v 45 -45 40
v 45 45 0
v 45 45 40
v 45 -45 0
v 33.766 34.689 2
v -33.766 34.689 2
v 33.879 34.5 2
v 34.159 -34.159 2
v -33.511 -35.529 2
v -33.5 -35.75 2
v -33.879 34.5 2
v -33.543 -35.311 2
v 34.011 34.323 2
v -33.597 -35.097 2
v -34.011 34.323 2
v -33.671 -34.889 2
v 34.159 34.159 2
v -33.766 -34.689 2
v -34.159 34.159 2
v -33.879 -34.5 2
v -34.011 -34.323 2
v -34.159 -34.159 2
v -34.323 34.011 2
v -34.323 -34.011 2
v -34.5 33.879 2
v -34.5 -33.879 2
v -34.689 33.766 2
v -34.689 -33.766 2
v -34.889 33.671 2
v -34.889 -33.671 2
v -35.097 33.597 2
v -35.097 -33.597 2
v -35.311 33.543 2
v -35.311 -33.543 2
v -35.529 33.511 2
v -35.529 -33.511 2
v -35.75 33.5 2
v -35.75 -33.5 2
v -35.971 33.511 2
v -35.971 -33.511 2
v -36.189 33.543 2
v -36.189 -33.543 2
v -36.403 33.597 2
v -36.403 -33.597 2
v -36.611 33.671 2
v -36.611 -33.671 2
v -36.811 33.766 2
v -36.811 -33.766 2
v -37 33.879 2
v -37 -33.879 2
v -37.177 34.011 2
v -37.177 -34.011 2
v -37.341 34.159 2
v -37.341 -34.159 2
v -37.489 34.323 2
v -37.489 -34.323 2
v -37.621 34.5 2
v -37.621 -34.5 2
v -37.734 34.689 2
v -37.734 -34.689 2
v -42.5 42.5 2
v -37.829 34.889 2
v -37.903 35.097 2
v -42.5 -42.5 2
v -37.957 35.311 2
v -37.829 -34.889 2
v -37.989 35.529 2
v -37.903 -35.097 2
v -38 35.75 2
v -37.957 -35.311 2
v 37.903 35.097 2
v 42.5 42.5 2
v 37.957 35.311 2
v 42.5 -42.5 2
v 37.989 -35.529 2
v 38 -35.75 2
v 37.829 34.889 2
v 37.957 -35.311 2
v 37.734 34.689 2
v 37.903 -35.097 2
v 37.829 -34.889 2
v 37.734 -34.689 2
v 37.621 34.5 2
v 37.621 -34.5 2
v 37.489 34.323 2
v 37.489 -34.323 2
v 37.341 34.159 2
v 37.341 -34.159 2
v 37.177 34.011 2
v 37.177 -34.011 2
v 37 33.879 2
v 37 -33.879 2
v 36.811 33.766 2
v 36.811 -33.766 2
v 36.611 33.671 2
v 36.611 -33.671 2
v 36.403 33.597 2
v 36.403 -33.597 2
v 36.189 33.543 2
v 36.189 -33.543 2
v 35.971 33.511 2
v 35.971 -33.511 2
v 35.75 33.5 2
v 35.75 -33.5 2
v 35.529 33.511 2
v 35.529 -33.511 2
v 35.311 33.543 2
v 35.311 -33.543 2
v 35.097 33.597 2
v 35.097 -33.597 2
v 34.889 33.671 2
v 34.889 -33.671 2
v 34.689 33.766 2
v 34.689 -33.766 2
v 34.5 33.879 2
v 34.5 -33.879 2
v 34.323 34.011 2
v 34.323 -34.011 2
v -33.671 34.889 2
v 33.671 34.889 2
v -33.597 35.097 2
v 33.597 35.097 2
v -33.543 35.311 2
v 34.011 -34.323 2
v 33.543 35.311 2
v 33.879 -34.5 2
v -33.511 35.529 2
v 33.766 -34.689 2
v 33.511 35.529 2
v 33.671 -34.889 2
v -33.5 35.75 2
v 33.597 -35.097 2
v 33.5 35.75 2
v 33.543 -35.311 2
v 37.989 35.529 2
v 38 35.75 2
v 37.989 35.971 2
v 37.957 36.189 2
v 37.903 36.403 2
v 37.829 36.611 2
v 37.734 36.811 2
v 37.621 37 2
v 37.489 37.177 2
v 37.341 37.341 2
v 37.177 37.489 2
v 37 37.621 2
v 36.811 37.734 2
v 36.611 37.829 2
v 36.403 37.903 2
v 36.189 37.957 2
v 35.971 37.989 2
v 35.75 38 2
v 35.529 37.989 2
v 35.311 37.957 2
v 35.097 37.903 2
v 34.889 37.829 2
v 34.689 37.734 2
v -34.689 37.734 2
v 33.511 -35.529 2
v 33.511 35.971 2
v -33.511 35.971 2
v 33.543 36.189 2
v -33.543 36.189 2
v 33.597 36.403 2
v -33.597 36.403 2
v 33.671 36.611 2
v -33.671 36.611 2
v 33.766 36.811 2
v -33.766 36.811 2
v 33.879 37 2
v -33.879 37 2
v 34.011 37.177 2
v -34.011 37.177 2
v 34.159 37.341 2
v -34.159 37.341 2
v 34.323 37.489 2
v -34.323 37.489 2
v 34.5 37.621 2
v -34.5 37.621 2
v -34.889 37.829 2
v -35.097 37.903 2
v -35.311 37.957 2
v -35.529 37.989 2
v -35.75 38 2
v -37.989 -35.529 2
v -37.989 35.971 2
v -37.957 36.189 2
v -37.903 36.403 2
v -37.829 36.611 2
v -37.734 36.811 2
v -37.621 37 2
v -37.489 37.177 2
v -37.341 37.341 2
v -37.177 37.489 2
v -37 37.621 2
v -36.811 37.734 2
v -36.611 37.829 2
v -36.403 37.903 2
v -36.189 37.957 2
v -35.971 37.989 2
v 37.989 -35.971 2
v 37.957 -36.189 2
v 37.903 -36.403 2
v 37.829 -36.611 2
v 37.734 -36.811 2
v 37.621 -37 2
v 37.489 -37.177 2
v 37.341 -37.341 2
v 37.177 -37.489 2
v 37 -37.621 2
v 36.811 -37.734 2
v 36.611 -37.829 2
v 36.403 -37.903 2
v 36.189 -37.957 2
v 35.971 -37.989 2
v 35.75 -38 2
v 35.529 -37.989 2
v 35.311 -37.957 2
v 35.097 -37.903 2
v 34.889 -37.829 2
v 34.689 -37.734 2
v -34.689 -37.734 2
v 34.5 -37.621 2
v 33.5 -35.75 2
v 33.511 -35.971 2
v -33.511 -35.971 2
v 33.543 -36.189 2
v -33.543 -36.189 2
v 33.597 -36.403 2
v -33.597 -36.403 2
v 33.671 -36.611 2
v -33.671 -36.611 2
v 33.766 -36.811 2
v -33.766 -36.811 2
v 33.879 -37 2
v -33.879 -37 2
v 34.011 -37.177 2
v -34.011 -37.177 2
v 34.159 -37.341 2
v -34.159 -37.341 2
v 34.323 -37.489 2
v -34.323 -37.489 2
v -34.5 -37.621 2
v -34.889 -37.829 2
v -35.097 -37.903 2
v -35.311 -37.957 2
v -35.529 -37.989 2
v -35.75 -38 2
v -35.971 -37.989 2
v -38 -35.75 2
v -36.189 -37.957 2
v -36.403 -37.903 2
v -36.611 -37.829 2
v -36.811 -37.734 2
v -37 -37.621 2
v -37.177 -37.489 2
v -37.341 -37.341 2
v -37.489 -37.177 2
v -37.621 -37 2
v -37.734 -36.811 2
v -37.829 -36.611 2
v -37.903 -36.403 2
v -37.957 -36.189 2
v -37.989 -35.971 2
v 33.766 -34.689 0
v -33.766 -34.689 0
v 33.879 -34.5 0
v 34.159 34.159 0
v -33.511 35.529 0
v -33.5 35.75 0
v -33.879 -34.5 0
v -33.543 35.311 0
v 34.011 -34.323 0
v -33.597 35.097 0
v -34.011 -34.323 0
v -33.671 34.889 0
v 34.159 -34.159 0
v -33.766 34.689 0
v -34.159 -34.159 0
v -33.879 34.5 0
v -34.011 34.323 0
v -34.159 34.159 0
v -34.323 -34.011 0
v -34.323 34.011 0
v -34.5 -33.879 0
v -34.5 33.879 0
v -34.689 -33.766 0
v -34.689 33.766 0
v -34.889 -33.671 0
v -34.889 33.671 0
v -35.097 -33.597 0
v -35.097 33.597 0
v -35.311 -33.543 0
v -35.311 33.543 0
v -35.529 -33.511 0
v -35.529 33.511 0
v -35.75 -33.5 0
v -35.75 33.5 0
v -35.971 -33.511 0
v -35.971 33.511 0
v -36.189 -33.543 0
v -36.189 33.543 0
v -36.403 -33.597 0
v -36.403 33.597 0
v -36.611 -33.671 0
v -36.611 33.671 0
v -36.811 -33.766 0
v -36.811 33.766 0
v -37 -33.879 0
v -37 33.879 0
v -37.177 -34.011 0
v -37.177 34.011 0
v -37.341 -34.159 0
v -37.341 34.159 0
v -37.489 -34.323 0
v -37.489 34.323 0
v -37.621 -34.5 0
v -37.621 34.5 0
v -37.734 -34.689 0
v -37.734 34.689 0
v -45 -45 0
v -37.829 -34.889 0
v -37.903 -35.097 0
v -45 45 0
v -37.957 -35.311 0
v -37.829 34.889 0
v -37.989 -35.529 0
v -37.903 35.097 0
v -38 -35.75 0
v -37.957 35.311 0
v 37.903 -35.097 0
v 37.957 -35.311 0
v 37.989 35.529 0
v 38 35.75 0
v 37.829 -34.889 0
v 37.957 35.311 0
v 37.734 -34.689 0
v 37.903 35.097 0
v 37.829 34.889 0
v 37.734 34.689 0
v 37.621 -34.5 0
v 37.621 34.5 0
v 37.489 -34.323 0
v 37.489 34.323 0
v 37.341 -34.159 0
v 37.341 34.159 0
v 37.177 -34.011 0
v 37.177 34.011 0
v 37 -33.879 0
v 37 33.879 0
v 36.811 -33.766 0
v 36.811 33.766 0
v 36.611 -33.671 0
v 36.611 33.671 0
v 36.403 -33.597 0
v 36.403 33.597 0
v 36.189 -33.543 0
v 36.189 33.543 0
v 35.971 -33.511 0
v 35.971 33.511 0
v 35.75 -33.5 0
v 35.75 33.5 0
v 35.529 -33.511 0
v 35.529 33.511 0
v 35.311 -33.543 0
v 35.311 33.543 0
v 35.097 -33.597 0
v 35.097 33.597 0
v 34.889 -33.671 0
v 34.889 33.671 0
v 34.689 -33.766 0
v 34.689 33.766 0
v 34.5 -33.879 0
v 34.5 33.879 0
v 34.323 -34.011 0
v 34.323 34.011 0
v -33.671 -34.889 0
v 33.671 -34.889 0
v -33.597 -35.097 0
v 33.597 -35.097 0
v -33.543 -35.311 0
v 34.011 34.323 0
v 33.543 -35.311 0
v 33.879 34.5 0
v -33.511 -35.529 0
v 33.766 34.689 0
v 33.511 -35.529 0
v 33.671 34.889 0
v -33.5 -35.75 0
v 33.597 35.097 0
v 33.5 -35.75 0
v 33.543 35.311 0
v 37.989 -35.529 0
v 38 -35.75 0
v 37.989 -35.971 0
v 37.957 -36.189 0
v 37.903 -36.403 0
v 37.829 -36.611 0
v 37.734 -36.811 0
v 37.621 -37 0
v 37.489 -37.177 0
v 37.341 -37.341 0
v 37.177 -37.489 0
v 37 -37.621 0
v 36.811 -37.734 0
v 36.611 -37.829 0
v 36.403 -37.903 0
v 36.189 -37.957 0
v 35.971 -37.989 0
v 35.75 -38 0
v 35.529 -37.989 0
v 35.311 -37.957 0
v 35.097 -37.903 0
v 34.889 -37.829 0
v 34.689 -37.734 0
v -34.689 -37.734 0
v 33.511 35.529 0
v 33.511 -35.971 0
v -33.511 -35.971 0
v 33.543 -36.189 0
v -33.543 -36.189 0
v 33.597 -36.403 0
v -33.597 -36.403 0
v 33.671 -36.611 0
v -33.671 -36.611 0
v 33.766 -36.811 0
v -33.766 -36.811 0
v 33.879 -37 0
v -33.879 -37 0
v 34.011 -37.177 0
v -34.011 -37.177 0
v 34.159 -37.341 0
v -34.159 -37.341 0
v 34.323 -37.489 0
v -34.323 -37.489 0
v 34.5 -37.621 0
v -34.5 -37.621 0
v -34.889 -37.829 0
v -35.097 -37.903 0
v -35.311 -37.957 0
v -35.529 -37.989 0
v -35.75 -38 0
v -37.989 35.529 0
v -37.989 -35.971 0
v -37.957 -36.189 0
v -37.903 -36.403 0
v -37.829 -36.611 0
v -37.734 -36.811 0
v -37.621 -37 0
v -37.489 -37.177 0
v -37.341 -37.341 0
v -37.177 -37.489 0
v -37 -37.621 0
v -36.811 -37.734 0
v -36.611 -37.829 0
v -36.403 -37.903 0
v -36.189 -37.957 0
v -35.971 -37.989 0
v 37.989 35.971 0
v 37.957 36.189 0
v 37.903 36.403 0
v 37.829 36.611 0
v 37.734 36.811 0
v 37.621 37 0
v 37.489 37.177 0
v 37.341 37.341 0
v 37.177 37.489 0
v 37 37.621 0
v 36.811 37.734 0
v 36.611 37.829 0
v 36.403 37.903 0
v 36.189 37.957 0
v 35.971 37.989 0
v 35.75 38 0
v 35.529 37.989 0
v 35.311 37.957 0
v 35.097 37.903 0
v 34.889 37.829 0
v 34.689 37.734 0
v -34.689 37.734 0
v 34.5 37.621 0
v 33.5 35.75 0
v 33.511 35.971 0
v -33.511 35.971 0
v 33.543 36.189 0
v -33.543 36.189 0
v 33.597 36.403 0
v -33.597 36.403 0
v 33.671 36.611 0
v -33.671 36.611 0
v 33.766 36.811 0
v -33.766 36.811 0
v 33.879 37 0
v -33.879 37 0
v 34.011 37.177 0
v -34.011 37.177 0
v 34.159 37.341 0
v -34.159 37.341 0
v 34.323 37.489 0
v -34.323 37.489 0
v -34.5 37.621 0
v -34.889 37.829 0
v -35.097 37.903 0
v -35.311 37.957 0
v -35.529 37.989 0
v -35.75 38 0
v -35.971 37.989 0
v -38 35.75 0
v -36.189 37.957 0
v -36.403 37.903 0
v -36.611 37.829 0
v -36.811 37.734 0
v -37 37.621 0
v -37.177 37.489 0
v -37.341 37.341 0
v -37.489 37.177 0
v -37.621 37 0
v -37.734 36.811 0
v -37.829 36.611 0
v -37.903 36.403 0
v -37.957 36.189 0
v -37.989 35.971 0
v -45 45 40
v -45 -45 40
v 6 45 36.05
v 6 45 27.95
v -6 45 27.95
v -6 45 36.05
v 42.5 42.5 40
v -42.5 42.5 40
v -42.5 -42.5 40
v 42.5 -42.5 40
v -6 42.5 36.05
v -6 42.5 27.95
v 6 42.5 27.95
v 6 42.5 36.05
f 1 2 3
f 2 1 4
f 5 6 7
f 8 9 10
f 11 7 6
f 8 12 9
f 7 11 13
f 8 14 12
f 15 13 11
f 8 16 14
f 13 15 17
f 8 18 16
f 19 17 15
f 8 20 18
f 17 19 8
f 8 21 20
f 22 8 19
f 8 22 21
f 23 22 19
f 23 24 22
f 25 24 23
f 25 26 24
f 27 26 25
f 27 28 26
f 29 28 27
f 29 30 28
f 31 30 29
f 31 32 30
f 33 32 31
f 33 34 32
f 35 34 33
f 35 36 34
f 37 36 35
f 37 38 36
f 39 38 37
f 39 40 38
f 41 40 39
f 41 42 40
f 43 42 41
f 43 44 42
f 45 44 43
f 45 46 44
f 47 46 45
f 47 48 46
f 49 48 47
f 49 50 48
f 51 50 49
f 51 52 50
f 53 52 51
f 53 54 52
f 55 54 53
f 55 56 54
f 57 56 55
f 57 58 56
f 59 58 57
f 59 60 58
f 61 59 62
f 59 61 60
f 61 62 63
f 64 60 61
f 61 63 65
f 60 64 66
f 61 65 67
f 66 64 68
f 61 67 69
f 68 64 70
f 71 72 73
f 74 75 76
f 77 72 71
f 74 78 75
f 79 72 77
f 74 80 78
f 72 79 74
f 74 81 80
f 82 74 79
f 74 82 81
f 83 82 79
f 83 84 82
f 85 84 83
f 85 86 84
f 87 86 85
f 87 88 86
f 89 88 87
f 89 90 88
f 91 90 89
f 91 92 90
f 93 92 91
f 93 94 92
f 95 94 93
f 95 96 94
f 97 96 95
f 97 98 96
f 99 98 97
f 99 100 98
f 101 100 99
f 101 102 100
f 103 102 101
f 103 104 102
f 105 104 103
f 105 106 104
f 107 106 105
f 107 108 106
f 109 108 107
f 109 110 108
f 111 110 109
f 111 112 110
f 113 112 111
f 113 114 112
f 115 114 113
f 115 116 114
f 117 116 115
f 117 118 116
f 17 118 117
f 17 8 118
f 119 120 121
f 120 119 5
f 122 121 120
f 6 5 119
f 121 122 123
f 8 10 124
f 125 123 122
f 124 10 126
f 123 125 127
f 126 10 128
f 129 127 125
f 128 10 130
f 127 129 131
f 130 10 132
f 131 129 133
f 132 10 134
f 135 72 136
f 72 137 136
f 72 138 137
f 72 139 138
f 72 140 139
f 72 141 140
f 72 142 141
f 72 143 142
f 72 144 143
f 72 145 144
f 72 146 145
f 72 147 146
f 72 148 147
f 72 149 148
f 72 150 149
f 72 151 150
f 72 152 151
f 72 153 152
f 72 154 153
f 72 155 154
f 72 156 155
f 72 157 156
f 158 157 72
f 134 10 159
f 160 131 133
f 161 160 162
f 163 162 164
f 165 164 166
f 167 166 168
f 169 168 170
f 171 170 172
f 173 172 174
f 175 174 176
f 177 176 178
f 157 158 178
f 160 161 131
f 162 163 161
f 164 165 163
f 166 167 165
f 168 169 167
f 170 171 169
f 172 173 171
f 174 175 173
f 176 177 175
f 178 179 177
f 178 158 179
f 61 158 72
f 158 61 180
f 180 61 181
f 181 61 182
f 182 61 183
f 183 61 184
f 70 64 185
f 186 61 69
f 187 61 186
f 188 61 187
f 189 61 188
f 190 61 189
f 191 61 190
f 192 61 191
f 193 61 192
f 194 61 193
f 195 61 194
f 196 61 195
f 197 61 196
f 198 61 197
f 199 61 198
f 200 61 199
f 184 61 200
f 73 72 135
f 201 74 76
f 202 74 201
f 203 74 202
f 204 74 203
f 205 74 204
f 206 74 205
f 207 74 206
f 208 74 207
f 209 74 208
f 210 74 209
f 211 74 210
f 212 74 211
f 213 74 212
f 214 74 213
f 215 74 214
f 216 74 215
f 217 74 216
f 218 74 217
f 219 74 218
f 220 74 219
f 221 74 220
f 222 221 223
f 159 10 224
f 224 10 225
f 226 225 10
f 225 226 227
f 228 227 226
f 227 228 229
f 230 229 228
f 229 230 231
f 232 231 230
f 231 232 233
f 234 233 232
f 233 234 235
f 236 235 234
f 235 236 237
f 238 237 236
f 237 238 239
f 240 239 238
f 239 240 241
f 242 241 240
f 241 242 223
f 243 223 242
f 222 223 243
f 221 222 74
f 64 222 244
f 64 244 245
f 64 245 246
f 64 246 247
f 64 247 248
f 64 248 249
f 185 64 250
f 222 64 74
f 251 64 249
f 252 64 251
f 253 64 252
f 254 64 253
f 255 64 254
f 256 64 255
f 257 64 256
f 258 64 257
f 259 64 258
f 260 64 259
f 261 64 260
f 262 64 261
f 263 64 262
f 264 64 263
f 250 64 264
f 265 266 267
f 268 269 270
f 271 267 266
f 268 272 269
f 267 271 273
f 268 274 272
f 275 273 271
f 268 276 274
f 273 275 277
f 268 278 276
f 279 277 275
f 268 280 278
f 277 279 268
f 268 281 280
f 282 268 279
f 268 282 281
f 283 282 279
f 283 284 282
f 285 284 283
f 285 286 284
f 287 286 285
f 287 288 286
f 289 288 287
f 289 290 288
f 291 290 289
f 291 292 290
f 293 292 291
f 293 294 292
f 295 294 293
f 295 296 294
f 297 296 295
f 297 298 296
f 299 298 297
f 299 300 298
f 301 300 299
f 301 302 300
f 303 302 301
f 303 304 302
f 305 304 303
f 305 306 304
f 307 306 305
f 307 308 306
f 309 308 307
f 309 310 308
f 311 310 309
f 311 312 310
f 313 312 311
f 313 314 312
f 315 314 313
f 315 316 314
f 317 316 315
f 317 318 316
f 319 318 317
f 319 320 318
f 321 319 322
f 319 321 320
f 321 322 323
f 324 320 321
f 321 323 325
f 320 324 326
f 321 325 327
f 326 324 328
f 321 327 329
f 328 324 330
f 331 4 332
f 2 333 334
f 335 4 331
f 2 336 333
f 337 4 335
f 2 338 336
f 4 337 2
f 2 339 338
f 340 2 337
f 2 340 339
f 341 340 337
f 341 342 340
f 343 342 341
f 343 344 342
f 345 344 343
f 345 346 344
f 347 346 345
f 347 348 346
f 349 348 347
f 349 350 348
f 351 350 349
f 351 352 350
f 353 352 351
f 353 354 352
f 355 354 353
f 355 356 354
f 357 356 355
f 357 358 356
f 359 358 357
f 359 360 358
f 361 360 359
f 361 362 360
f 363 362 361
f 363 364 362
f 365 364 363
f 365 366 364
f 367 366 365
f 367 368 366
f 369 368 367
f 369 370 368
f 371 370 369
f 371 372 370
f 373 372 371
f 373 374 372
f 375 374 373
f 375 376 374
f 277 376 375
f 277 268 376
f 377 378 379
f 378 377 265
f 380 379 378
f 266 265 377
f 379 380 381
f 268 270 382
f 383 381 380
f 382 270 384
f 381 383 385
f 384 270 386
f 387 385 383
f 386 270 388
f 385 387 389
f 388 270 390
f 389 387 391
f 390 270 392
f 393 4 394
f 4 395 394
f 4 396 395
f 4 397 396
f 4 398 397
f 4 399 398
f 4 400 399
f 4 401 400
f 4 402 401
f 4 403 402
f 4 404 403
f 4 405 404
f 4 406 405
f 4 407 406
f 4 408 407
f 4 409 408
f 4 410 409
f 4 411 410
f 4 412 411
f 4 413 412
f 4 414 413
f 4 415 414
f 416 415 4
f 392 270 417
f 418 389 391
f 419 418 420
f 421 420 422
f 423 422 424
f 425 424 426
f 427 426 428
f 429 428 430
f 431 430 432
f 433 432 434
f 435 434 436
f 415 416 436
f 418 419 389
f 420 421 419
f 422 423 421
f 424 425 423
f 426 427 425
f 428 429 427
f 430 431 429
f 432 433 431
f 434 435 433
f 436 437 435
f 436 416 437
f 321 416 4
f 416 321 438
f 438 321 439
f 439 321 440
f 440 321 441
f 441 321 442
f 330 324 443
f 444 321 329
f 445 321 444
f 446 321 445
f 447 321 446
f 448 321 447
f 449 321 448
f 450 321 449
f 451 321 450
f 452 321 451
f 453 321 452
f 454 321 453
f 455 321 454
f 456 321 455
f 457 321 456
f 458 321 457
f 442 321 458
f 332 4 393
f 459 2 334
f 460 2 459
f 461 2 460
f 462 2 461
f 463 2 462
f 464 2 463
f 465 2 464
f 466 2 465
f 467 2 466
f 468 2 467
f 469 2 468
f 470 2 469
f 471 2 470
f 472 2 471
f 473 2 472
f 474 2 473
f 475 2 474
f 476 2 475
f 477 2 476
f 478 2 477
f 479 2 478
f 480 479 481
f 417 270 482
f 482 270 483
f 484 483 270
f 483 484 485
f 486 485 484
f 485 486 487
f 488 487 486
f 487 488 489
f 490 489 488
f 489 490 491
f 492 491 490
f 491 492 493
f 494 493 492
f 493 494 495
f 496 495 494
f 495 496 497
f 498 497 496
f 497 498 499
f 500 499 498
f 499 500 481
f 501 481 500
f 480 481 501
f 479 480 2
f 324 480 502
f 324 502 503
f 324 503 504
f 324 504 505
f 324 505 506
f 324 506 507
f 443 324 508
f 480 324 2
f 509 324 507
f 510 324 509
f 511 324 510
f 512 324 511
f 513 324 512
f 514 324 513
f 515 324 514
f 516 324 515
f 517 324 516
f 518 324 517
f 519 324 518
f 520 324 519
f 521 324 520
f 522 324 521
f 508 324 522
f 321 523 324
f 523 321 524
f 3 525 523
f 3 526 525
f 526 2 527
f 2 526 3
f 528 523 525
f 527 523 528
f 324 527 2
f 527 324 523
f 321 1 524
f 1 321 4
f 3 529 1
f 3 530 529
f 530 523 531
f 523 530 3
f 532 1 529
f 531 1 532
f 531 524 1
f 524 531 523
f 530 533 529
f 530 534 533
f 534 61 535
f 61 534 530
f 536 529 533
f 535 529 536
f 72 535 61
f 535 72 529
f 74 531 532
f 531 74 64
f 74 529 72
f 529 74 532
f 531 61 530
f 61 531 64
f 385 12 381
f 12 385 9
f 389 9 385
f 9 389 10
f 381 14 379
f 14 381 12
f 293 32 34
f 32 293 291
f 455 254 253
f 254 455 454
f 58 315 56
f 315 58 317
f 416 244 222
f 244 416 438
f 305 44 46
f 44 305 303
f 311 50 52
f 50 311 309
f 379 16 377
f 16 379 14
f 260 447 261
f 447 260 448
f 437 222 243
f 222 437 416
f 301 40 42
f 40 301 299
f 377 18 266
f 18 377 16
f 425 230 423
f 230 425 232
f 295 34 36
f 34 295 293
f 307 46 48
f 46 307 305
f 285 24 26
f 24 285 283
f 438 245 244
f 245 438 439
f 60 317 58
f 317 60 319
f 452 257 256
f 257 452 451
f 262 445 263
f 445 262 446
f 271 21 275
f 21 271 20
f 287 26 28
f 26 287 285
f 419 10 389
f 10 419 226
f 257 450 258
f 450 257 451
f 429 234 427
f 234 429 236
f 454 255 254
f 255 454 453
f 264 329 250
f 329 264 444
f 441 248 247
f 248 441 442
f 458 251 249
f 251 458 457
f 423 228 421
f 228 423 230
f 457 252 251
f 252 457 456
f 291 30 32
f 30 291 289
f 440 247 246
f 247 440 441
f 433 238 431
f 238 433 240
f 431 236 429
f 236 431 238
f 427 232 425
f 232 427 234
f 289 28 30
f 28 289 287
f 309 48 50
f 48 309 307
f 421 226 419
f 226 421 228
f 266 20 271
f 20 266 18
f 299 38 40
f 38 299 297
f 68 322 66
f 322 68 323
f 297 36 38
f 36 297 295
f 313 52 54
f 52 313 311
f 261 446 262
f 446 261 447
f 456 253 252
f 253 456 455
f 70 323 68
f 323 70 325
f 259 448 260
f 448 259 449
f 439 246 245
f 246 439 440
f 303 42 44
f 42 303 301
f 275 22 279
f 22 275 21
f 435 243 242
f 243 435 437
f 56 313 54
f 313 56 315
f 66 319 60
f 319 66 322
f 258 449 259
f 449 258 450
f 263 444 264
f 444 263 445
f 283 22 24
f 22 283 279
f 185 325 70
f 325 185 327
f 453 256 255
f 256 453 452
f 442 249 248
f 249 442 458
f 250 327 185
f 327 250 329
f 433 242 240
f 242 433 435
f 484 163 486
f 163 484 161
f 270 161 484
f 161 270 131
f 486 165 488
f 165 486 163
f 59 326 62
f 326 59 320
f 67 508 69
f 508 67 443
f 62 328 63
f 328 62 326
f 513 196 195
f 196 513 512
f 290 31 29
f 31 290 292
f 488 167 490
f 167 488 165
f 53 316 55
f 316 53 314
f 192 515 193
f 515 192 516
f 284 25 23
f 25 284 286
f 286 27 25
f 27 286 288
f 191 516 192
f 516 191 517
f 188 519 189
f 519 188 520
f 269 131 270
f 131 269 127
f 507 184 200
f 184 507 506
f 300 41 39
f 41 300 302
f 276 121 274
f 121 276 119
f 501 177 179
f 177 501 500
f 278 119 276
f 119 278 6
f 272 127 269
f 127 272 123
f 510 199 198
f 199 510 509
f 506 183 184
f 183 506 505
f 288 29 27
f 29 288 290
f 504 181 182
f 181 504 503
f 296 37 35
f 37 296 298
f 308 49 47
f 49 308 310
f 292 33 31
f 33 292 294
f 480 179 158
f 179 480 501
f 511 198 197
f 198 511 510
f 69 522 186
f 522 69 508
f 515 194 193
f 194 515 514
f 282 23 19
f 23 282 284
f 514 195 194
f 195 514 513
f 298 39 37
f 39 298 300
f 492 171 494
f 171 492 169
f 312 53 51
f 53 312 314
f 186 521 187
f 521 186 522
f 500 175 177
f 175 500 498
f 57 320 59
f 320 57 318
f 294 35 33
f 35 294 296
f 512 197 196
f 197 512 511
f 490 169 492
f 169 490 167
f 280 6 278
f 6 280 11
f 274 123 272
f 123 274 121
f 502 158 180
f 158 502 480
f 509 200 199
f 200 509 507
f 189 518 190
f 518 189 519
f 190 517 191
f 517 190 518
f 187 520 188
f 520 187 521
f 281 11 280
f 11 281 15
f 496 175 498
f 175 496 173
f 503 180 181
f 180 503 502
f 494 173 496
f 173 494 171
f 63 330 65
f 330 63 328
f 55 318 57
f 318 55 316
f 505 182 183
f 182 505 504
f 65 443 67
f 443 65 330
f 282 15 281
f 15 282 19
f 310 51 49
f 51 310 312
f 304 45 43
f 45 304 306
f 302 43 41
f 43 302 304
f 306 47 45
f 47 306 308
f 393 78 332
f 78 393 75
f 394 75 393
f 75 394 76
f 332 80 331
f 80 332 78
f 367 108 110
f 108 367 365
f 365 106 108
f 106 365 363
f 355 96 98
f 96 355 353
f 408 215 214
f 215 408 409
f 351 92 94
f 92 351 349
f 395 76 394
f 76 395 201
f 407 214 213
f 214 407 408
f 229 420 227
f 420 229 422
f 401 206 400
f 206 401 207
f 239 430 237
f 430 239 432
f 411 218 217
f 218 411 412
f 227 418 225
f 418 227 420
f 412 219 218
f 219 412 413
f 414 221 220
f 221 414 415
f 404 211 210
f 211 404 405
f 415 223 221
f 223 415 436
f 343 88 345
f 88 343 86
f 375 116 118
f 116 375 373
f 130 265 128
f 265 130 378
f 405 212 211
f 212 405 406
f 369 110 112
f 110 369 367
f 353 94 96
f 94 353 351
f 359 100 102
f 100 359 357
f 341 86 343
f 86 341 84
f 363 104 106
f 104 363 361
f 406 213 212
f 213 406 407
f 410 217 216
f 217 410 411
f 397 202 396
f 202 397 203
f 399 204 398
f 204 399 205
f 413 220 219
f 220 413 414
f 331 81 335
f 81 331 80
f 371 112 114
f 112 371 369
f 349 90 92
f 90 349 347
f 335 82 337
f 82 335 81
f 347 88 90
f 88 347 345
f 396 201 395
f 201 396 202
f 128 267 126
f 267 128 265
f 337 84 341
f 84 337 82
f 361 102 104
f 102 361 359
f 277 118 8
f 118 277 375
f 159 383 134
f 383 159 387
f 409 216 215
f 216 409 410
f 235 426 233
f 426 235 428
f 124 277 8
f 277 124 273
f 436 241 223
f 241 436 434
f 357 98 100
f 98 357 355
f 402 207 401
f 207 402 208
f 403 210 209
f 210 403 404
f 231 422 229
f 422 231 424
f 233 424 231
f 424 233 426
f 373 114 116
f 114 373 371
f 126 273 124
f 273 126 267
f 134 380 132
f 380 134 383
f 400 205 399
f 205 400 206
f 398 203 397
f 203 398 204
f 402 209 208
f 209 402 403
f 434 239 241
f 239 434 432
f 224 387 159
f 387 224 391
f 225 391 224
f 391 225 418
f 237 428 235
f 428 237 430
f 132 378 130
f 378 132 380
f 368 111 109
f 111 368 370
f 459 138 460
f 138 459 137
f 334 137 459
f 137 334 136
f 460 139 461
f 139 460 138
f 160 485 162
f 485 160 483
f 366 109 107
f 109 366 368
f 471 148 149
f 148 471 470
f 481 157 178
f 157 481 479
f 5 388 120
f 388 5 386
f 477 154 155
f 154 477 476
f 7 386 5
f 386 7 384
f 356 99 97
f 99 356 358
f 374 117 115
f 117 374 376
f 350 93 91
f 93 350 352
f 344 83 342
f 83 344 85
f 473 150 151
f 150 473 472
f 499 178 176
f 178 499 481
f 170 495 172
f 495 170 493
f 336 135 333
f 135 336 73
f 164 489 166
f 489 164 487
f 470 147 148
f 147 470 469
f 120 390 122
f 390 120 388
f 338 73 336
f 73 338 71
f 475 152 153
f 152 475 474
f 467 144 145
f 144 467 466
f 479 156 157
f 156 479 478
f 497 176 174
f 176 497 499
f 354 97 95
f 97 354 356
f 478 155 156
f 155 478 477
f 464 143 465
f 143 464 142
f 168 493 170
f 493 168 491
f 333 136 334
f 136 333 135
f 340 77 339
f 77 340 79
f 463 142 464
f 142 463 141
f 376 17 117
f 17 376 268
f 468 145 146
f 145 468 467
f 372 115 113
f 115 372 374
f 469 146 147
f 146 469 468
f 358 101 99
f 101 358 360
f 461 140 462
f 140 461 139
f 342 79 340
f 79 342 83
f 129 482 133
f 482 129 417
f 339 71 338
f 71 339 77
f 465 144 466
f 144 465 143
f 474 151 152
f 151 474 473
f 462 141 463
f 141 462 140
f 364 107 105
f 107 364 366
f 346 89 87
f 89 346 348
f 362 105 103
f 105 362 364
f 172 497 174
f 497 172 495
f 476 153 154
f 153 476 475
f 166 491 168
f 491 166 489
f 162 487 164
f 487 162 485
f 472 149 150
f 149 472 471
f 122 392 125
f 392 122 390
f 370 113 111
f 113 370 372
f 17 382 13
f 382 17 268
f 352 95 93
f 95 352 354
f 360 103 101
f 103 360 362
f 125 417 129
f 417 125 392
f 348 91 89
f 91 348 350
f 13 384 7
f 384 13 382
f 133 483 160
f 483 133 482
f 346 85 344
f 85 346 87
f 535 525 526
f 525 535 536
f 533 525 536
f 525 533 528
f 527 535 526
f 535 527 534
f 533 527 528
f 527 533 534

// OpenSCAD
// DIY Magnetic Stirrer Housing for 80mm PC Fan
// Designed for FDM 3D printing
// Print orientation: Upside down (top plate on bed)

// --- Dimensions (mm) ---
plate_thickness = 2;       // Thickness of the top plate (stirring surface)
wall_thickness = 2.5;      // Thickness of the side walls
box_outer_size = 90;       // Outer dimension of the box (X and Y)
box_height = 40;           // Height of the walls (from top plate to open edge)
hole_diameter = 4.5;       // Diameter for M4 screw holes
hole_pattern = 71.5;       // Center-to-center distance of the 4-hole square pattern
notch_width = 12;          // Width of the power cable notch
notch_depth = 8;           // Depth of the notch from the open edge (z=40 down to z=32)

// --- Derived Dimensions ---
hole_offset = hole_pattern / 2; // Distance from center to each hole
notch_z_start = box_height - notch_depth; // Z position where notch starts (32)
inner_size = box_outer_size - 2 * wall_thickness; // Inner dimension of the box (85mm)

// --- Main Structure ---
$fn = 64; // High resolution for smooth holes and curves

difference() {
    // Union of the box components
    union() {
        // Top Plate (rests on z=0 to z=plate_thickness)
        translate([-box_outer_size/2, -box_outer_size/2, 0])
            cube([box_outer_size, box_outer_size, plate_thickness]);

        // Four Walls (rise from top plate to z=box_height)
        // Front Wall (positive Y)
        translate([-box_outer_size/2, box_outer_size/2 - wall_thickness, plate_thickness])
            cube([box_outer_size, wall_thickness, box_height - plate_thickness]);

        // Back Wall (negative Y)
        translate([-box_outer_size/2, -box_outer_size/2, plate_thickness])
            cube([box_outer_size, wall_thickness, box_height - plate_thickness]);

        // Right Wall (positive X)
        translate([box_outer_size/2 - wall_thickness, -box_outer_size/2, plate_thickness])
            cube([wall_thickness, box_outer_size, box_height - plate_thickness]);

        // Left Wall (negative X)
        translate([-box_outer_size/2, -box_outer_size/2, plate_thickness])
            cube([wall_thickness, box_outer_size, box_height - plate_thickness]);
    }

    // --- Cutouts ---

    // 1. Four M4 Screw Holes in the Top Plate
    // Pattern is centered on the plate, 71.5mm square
    for (x = [-hole_offset, hole_offset]) {
        for (y = [-hole_offset, hole_offset]) {
            translate([x, y, -0.1]) // Extend slightly below z=0 to ensure clean cut
                cylinder(h = plate_thickness + 0.2, r = hole_diameter / 2, center = false);
        }
    }

    // 2. Power Cable Notch in One Wall
    // Cut in the "Front" wall (positive Y side)
    // Notch is 12mm wide, centered on the wall, from z=32 to z=40
    // The notch must only cut through the wall material, not the entire box width.
    // The wall is at Y = [box_outer_size/2 - wall_thickness, box_outer_size/2]
    // Center of the wall face is at Y = box_outer_size/2 - wall_thickness/2
    translate([0, box_outer_size/2 - wall_thickness/2, notch_z_start])
        cube([notch_width, wall_thickness + 0.1, notch_depth + 0.1], center = true);
}
